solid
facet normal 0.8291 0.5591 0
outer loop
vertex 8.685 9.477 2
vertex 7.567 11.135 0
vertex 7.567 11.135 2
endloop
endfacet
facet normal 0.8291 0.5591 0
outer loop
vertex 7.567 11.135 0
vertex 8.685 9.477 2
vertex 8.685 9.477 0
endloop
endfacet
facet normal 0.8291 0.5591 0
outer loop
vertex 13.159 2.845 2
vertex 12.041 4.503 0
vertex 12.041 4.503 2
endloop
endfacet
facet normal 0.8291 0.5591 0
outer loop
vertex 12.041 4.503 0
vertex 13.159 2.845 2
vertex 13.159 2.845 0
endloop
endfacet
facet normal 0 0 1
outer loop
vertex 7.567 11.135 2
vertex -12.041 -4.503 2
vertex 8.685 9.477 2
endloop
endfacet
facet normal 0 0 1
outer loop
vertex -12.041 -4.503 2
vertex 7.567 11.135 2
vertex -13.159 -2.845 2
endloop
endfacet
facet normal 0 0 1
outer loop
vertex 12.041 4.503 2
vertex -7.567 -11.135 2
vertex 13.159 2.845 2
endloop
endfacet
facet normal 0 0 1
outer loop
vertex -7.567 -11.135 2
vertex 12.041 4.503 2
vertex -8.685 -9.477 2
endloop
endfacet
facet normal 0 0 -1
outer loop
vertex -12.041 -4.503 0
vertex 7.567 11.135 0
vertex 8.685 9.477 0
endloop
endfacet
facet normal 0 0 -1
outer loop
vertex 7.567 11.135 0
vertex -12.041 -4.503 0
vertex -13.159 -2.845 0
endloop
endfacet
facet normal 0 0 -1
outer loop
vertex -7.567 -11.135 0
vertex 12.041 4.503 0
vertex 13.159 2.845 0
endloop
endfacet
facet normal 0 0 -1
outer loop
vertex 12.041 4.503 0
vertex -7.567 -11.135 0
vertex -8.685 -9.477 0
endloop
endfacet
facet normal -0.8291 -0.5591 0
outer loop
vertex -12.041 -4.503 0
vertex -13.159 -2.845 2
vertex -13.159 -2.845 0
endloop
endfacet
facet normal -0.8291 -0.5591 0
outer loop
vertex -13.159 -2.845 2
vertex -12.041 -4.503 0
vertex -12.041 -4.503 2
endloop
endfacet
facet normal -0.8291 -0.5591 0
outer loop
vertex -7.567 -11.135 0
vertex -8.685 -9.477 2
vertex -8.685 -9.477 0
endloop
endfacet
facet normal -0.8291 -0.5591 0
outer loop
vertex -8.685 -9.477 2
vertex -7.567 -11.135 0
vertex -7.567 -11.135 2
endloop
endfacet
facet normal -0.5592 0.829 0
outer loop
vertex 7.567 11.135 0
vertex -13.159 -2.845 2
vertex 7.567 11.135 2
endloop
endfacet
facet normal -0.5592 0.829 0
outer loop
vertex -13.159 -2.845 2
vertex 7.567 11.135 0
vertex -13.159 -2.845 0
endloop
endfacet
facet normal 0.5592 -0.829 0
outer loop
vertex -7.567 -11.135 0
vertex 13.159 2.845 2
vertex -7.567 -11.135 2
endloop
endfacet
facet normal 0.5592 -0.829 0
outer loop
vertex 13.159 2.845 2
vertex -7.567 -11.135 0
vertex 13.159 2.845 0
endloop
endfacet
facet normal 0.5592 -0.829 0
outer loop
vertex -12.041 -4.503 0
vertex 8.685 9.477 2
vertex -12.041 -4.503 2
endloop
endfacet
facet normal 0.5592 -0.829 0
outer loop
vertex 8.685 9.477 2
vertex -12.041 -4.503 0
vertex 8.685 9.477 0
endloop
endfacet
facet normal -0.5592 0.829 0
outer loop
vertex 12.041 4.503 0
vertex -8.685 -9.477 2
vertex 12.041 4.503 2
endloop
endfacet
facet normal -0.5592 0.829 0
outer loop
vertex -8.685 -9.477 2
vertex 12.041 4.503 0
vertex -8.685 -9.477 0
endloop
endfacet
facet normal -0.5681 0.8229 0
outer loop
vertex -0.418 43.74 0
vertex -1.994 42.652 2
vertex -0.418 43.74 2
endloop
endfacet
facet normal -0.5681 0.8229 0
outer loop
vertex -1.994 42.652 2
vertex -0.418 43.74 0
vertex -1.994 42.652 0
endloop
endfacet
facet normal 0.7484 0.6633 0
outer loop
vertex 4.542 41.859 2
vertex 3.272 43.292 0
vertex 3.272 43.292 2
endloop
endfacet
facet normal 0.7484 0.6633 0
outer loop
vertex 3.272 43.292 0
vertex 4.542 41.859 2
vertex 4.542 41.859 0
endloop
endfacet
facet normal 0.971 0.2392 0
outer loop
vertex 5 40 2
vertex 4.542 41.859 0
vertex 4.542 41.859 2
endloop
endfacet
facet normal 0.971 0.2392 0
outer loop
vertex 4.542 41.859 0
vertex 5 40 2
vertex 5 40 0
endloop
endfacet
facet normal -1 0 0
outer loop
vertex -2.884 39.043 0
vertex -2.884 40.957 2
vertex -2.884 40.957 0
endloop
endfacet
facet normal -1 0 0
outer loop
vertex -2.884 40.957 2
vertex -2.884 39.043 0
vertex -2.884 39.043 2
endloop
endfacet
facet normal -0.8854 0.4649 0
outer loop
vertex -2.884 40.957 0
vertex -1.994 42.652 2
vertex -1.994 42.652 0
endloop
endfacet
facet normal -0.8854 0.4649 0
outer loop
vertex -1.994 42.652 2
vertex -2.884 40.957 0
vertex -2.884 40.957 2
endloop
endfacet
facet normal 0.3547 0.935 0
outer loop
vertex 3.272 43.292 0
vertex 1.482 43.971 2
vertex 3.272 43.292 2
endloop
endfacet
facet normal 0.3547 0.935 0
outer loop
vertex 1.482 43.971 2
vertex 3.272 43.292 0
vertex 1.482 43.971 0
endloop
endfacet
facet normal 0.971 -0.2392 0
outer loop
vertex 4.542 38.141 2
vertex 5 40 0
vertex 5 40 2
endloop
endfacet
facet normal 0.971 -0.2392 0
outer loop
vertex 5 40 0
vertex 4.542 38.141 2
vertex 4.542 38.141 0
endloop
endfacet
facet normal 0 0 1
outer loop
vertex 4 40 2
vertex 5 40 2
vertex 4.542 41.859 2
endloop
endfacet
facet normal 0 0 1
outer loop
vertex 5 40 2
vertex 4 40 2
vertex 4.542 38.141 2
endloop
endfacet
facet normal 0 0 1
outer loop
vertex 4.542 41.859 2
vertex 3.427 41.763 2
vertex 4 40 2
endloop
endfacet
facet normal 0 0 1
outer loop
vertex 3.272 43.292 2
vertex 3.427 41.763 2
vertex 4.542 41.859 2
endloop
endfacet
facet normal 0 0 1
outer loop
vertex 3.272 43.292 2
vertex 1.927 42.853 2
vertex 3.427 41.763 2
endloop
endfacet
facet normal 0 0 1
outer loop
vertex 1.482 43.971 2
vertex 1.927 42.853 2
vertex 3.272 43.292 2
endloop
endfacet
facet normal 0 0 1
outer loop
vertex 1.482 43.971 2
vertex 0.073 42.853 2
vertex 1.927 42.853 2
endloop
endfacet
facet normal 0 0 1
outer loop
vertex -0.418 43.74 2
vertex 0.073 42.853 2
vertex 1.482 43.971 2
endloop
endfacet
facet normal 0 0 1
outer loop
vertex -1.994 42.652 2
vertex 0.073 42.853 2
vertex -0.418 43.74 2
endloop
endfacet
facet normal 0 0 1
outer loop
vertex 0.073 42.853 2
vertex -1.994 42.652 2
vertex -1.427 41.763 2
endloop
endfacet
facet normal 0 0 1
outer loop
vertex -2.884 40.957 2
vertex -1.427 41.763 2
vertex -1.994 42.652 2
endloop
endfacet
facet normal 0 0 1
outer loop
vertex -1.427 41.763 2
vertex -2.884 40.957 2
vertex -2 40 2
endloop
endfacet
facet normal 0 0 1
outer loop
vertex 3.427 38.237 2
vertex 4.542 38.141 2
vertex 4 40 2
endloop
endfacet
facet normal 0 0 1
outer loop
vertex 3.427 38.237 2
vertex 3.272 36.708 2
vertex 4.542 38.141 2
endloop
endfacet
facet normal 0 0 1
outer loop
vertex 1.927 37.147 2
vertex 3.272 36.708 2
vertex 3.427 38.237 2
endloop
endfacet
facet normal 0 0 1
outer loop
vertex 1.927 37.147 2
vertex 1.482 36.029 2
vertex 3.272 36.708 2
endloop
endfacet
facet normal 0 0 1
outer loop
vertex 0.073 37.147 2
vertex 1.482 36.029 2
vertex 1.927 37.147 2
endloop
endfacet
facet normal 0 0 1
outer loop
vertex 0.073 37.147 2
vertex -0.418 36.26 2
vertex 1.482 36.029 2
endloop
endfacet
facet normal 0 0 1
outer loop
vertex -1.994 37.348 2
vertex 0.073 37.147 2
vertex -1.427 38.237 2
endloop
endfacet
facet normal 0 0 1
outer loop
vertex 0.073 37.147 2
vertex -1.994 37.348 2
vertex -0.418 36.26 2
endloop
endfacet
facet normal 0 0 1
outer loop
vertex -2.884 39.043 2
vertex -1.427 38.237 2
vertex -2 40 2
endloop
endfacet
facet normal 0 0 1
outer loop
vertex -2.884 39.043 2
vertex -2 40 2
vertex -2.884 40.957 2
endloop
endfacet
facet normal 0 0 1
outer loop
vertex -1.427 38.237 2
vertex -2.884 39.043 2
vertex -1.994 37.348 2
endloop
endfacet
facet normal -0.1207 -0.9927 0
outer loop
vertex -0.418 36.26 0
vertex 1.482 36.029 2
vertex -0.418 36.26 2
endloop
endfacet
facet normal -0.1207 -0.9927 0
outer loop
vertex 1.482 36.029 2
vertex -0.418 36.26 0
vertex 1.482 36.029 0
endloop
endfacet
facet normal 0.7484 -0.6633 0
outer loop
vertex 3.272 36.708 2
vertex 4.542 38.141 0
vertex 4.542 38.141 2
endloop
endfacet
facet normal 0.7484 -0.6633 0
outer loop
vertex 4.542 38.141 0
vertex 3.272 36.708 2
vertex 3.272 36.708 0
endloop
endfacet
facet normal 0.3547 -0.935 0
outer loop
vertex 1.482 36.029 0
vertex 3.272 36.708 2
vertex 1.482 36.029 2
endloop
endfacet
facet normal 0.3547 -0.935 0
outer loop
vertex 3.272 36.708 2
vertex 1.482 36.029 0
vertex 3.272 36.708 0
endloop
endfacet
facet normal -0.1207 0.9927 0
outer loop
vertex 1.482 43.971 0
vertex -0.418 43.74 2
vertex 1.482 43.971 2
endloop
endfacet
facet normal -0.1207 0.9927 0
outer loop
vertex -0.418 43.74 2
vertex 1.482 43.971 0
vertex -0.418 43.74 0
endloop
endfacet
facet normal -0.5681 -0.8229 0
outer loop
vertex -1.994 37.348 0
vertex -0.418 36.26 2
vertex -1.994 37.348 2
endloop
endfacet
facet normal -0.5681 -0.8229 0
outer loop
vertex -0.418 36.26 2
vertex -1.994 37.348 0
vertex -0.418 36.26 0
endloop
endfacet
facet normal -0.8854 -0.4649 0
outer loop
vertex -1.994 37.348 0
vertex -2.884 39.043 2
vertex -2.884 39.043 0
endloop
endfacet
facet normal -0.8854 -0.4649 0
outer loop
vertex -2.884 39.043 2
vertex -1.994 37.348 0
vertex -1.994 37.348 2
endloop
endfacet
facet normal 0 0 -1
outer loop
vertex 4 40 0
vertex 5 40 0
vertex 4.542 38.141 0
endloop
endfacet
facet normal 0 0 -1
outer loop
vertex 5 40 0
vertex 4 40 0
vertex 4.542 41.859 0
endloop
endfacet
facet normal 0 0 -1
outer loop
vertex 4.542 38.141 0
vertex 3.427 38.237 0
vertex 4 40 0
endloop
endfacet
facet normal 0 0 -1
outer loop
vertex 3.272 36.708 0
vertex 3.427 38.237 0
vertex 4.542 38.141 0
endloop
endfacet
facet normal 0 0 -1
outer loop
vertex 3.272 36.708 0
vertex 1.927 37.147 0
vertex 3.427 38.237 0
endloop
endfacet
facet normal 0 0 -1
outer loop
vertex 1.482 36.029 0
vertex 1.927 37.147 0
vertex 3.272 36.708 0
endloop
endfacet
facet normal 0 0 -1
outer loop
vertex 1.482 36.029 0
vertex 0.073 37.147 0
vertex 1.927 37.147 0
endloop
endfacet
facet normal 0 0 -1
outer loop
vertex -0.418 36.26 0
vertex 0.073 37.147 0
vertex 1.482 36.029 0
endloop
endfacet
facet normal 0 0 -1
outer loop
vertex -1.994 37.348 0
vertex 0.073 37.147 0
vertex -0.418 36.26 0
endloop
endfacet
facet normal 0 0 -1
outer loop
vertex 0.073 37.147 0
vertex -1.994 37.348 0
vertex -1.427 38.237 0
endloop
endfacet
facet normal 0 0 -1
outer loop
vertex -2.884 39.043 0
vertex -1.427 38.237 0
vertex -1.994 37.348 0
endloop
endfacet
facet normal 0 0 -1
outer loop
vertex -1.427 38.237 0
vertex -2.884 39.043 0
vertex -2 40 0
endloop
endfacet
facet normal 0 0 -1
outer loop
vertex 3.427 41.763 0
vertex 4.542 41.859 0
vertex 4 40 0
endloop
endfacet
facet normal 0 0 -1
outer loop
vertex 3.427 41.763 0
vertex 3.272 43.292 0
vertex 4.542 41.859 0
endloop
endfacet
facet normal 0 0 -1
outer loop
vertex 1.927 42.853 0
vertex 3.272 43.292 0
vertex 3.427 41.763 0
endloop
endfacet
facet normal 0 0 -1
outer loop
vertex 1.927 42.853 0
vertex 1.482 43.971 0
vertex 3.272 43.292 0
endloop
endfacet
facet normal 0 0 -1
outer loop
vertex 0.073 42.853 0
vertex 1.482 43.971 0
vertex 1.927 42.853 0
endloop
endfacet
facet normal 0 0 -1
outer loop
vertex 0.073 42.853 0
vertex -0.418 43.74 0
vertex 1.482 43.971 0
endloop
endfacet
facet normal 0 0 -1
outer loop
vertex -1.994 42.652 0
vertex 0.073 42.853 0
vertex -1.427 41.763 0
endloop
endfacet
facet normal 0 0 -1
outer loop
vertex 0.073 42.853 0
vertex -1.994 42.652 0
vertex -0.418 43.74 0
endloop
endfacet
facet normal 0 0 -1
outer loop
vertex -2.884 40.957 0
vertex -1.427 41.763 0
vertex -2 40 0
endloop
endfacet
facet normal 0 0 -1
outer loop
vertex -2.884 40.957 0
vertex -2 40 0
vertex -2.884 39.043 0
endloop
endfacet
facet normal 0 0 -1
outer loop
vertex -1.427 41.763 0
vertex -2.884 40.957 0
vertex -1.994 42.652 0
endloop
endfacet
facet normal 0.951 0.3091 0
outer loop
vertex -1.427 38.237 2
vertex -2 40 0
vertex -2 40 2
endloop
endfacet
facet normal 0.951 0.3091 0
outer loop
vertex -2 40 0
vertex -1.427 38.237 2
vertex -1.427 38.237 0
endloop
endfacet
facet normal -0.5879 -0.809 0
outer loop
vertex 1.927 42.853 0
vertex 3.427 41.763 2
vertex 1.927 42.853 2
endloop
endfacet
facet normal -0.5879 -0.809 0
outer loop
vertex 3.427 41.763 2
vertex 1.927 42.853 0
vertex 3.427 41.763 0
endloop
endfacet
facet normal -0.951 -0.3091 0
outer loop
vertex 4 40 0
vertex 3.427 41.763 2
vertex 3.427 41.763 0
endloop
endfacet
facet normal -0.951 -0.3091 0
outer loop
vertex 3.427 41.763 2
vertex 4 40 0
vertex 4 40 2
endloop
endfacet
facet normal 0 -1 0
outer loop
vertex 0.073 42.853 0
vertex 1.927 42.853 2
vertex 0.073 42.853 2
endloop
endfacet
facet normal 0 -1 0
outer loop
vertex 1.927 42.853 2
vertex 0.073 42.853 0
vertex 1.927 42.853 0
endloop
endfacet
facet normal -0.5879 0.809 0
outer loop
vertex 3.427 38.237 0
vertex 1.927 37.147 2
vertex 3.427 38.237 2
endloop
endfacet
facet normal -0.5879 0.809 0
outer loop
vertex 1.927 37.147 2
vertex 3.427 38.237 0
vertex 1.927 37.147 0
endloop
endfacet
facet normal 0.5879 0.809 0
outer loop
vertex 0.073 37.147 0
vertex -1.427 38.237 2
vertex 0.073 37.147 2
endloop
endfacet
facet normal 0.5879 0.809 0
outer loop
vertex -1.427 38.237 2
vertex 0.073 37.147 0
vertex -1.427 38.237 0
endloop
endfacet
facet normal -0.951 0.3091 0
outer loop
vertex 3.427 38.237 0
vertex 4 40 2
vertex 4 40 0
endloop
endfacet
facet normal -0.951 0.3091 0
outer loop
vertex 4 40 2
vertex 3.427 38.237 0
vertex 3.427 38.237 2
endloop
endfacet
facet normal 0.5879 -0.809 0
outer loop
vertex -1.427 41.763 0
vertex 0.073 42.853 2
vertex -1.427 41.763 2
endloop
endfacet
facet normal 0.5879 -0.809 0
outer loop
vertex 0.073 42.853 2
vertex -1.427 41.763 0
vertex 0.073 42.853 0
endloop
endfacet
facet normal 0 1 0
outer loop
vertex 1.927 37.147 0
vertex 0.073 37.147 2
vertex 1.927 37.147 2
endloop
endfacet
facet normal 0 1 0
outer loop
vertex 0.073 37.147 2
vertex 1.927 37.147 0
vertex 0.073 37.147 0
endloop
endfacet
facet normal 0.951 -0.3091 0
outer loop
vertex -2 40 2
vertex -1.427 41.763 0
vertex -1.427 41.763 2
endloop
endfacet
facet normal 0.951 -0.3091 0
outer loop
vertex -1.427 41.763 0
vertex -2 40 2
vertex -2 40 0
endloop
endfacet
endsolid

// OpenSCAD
// Logo
translate([0,0,2])
    linear_extrude(height = 4, center = true, convexity = 10)
        scale([0.5,0.5,1]) translate([-105,-158,0])
                import (file = "sslogo5.dxf");

// connector
translate([0,0,1]) rotate([0,0,34]) 
    difference() {
        cube(size=[25,10,2], center = true);
        cube(size=[25,6,3], center = true);
    }

// hook
translate([1,40,0])
    difference() {
        cylinder(h=2, r=4);
        translate([0,0,-1]) cylinder(h=5, r=3);
    }
